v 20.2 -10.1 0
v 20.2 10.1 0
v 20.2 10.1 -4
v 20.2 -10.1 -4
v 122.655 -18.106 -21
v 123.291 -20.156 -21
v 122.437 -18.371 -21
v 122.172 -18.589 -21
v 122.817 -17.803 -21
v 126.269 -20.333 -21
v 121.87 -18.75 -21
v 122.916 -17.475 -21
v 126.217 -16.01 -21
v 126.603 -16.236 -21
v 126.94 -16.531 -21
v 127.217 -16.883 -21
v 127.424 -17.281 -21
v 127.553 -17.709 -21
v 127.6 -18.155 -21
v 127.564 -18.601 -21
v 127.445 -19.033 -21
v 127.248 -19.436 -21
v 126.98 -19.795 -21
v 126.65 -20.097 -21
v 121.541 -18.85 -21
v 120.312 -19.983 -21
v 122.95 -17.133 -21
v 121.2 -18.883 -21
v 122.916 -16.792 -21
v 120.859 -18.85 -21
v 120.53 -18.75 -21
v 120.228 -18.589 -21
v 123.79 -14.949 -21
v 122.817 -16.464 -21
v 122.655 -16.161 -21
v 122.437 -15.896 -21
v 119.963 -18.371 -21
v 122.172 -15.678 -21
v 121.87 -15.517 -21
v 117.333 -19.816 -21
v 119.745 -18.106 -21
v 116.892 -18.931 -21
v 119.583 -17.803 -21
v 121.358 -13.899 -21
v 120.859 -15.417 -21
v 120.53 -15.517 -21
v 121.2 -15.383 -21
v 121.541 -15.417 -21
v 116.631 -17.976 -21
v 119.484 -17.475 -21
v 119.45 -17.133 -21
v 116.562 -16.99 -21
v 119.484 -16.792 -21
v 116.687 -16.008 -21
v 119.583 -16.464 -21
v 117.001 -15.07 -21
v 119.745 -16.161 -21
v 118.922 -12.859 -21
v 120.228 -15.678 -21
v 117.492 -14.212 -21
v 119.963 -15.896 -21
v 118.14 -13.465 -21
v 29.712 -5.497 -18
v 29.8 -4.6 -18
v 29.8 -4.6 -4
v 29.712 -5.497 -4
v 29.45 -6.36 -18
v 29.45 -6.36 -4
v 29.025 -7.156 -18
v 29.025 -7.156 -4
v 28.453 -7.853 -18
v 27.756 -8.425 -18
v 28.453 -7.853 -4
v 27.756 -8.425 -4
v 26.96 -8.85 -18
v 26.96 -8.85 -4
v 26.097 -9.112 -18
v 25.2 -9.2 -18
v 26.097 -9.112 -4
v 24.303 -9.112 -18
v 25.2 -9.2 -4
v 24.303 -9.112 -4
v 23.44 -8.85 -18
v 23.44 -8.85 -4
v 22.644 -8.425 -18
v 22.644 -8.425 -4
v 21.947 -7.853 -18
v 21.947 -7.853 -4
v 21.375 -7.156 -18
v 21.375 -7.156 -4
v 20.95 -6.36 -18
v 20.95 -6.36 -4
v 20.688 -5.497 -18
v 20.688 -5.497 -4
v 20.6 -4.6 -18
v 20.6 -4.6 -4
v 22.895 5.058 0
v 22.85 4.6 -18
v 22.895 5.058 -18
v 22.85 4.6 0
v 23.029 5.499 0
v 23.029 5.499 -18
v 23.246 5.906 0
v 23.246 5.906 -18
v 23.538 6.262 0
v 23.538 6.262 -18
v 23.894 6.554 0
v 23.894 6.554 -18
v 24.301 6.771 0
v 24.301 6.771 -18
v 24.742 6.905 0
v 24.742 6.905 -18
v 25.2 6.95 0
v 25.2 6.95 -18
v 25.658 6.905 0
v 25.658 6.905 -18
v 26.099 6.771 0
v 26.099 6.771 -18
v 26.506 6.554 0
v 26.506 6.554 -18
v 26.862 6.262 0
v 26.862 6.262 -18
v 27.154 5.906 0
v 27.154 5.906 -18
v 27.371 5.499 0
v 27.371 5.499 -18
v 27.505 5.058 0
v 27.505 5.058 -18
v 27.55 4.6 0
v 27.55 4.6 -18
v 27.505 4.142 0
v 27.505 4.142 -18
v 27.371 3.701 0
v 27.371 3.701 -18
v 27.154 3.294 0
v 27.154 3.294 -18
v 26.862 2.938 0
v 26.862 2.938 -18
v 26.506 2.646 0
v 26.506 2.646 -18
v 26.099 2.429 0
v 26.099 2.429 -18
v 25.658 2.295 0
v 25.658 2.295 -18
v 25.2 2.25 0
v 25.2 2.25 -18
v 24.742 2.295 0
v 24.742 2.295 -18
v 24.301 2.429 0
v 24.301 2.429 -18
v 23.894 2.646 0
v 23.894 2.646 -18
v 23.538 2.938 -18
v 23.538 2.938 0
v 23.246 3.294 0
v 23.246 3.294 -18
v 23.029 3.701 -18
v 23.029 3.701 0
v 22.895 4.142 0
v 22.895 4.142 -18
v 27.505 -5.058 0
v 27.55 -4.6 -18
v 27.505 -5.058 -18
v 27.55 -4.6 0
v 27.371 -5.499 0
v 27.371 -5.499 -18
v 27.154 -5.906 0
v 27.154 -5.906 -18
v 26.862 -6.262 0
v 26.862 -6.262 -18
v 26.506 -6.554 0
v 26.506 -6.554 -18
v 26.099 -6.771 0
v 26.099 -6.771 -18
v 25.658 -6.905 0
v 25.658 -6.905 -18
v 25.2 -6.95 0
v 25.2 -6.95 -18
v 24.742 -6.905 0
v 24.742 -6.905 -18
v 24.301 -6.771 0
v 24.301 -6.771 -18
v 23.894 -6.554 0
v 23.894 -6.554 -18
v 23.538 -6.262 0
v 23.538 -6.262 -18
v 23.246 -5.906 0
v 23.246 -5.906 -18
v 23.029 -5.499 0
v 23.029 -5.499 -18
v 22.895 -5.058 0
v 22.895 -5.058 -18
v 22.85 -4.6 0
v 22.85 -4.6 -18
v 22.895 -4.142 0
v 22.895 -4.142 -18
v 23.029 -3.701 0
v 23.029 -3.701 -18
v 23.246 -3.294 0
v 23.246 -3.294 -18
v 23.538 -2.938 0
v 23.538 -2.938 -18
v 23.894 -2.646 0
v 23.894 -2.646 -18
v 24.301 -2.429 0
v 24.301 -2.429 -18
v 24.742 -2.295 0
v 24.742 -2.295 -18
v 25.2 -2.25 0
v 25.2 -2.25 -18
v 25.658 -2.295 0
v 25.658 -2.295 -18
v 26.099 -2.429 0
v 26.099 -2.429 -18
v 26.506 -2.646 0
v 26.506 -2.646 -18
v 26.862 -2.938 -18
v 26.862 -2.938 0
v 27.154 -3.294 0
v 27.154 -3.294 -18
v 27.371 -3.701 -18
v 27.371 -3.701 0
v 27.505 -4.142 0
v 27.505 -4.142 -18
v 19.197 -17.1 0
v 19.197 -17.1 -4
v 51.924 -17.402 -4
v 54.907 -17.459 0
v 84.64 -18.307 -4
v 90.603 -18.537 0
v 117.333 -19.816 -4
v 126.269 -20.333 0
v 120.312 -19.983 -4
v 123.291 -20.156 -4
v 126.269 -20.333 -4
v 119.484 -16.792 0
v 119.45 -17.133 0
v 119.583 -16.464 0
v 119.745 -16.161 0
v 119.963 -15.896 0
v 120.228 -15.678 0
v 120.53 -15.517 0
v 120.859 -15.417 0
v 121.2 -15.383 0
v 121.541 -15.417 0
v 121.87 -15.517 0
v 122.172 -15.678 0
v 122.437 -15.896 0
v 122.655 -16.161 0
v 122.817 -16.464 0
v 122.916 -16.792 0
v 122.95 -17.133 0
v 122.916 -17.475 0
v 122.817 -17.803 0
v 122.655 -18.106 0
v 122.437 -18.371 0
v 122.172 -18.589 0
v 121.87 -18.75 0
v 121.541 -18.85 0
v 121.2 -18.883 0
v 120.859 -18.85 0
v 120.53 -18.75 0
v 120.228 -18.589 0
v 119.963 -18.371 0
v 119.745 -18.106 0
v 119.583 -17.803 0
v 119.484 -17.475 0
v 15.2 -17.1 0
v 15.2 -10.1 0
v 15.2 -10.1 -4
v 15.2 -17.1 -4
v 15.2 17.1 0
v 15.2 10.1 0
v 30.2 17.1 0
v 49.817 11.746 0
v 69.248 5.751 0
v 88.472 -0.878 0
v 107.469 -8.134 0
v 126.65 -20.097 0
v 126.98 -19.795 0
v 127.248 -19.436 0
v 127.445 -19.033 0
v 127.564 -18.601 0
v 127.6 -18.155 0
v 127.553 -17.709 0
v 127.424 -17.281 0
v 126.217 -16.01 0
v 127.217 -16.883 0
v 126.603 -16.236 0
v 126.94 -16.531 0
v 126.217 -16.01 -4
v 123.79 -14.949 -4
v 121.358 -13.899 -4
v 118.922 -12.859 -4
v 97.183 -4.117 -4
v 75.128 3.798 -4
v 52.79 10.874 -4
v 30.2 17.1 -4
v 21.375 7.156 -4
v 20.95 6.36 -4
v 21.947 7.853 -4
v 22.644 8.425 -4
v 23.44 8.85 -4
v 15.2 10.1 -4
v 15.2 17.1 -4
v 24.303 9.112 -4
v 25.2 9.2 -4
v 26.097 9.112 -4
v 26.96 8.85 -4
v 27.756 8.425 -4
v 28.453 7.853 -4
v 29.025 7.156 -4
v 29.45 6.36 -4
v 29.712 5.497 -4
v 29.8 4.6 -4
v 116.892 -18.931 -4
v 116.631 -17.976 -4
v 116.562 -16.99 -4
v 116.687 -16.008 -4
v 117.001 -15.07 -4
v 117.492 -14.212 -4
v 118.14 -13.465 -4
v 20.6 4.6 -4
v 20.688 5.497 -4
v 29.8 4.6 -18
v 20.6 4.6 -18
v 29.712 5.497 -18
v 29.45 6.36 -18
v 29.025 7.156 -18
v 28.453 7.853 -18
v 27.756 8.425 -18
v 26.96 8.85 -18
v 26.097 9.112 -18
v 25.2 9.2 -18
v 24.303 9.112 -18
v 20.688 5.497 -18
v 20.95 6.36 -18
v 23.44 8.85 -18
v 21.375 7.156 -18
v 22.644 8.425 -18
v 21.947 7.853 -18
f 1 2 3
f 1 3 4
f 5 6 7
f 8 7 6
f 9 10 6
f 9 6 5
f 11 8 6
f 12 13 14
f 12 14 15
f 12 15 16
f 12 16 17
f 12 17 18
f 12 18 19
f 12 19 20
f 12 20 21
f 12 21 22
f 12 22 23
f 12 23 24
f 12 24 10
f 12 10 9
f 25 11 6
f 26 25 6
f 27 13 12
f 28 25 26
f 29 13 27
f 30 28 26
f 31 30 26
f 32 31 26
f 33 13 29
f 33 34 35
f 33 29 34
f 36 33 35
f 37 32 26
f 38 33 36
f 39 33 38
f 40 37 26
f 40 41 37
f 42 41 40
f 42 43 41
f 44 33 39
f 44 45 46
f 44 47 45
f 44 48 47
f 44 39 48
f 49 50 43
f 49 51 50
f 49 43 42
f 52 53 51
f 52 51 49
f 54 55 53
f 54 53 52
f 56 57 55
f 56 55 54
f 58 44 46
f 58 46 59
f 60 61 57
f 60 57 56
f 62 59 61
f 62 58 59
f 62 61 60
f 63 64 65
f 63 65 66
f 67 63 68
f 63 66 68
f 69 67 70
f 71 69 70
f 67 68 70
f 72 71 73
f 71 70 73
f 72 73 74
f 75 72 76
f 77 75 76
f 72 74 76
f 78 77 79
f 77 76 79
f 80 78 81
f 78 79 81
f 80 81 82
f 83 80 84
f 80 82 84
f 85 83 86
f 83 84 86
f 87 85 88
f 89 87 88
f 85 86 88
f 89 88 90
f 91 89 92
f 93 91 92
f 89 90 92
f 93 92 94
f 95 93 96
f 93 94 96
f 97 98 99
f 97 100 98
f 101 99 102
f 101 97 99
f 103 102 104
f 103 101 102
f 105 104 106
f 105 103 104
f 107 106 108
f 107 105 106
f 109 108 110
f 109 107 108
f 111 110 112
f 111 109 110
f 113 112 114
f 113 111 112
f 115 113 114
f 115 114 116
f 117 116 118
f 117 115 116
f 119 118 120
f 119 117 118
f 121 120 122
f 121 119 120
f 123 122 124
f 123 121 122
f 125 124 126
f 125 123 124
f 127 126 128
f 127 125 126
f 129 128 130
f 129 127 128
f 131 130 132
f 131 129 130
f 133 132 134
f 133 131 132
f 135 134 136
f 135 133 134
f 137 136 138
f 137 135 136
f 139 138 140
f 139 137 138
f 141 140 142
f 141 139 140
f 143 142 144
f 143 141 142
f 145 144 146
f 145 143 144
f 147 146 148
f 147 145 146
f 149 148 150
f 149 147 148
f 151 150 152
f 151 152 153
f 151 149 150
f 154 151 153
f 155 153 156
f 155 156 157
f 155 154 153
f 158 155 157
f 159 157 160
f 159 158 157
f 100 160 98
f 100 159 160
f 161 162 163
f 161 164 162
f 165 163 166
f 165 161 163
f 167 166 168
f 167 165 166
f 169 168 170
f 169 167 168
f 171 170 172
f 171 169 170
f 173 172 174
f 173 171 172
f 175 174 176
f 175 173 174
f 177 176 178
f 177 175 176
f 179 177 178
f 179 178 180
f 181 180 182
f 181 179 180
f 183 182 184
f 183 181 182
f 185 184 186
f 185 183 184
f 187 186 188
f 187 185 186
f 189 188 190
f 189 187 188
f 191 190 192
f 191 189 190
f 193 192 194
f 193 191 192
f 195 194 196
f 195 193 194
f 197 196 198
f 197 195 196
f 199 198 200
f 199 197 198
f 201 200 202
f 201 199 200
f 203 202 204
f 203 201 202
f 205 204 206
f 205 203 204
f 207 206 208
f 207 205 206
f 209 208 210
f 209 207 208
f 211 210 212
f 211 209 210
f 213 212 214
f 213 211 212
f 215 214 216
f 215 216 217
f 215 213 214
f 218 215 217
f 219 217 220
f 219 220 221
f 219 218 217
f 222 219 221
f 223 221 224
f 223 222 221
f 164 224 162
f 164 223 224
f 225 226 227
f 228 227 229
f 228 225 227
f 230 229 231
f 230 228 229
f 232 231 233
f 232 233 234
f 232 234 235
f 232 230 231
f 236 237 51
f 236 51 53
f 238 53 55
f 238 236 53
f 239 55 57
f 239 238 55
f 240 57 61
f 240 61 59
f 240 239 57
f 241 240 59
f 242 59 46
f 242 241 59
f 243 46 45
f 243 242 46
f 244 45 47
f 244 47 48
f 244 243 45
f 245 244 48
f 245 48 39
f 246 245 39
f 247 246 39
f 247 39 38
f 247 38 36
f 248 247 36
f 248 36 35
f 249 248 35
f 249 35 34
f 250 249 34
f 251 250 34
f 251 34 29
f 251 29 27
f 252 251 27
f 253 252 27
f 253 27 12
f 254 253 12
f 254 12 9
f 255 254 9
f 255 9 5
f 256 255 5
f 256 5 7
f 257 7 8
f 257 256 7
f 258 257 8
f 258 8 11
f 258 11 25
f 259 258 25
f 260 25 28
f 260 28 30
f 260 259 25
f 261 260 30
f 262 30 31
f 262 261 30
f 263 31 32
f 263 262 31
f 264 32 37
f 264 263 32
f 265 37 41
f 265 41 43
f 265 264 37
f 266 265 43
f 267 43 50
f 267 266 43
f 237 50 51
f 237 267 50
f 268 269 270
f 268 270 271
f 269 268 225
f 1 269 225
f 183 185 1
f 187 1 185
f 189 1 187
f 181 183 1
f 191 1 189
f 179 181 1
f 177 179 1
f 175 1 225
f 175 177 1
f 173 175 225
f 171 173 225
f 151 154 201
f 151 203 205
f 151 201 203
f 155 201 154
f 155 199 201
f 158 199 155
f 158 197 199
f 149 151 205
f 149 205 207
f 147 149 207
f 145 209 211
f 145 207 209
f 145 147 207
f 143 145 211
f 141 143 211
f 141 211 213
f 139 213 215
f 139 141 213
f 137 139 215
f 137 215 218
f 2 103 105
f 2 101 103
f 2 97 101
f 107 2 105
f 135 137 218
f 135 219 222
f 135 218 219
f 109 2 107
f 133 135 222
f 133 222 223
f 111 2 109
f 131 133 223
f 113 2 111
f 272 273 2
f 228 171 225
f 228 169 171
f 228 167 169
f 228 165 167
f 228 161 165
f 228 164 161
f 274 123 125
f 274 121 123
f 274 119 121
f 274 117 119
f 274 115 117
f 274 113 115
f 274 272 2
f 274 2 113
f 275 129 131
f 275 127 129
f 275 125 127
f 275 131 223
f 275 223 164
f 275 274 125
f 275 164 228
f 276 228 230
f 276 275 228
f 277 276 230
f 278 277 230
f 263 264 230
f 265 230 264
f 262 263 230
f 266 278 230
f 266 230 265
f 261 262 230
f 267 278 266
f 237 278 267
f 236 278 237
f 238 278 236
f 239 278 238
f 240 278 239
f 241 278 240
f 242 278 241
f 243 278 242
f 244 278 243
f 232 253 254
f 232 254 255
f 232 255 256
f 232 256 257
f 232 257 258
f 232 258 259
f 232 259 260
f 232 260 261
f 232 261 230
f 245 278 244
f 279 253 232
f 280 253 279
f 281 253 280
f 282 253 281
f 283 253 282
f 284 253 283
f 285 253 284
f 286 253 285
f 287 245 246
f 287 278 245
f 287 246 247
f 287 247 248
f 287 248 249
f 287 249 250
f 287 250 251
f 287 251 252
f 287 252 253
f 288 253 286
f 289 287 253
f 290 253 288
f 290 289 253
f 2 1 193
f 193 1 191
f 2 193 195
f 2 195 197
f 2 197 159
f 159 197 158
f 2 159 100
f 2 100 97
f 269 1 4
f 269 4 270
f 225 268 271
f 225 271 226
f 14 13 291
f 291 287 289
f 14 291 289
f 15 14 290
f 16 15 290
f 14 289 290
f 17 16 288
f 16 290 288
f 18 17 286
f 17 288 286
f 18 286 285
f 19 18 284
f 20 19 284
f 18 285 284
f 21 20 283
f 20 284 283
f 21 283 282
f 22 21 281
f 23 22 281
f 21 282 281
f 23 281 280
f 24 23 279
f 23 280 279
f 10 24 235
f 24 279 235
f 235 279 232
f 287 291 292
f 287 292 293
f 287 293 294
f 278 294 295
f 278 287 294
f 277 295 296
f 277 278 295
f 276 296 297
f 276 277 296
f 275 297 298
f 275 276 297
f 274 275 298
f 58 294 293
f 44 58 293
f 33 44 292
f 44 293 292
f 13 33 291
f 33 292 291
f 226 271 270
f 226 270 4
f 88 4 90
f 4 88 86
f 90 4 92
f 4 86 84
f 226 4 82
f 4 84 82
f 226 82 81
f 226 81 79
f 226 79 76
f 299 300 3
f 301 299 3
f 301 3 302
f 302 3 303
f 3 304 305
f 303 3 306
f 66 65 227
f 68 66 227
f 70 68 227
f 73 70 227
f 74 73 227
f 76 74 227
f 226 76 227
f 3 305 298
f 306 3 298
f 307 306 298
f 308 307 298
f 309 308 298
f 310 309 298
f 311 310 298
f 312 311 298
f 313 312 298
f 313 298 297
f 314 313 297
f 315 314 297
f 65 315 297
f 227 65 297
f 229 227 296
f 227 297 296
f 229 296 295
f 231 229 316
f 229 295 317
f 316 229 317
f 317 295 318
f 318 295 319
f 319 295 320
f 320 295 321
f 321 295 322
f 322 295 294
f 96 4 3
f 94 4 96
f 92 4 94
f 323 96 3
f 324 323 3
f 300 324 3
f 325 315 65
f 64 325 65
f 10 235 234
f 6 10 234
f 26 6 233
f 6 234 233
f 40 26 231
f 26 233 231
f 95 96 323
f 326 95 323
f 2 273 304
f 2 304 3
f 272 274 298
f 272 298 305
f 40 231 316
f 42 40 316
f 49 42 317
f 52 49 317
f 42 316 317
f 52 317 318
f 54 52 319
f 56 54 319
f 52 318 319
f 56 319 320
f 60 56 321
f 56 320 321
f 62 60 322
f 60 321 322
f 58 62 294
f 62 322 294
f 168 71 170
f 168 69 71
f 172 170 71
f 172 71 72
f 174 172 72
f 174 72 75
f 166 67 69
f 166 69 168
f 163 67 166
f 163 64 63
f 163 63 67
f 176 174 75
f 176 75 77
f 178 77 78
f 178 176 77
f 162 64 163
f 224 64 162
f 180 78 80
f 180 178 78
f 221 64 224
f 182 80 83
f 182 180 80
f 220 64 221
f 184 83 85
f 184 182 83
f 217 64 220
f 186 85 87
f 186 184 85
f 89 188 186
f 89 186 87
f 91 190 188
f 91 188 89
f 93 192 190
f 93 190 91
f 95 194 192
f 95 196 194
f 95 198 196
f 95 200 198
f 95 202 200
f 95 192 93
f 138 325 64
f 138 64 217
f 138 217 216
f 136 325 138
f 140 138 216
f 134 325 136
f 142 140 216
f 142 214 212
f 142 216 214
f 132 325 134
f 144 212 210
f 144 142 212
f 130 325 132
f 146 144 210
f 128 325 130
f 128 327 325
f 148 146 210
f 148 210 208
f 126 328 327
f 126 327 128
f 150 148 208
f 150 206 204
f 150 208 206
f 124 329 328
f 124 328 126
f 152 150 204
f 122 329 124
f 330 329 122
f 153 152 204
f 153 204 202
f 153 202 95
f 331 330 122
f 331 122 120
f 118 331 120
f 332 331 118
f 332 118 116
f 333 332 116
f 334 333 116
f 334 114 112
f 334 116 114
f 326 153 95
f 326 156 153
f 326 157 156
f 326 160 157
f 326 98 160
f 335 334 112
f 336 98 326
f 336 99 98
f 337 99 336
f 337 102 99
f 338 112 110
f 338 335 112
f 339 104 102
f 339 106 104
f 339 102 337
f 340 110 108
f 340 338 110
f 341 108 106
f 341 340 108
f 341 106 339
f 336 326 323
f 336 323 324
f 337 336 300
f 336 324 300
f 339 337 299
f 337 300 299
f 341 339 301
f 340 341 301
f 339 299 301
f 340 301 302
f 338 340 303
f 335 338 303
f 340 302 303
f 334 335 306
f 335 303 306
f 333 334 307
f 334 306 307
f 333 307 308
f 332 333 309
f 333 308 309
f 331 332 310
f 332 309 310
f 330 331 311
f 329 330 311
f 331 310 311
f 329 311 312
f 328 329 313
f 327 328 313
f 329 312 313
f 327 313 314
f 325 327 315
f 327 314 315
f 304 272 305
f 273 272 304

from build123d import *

# Parameters (mm, degrees)
SZKIC2_R                    = 2.35
DODANIE_WYCI_GNI_CIE1_DEPTH = 4
SZKIC3_R                    = 1.75
DODANIE_WYCI_GNI_CIE2_DEPTH = 17
DODANIE_WYCI_GNI_CIE3_DEPTH = 14
SZKIC6_R                    = 2.35
SZKIC6_R_2                  = 1.75
WYTNIJ_WYCI_GNI_CIE2_DEPTH  = 131.905876654


with BuildPart() as part:
    # Szkic2 → Dodanie-wyciągnięcie1 (new body)
    with BuildSketch(Plane.XY):
        with BuildLine():
            Line((15.2, 17.1), (15.2, 10.1))
            Line((15.2, 10.1), (20.2, 10.1))
            Line((20.2, 10.1), (20.2, -10.1))
            Line((20.2, -10.1), (15.2, -10.1))
            Line((15.2, -10.1), (15.2, -17.1))
            Line((15.2, -17.1), (19.197379501, -17.1))
            ThreePointArc((19.197379501, -17.1), (72.757727431, -17.908543704), (126.269263581, -20.333437957))
            ThreePointArc((126.269263581, -20.333437957), (127.600370297, -18.154974458), (126.216652739, -16.009543491))
            ThreePointArc((126.216652739, -16.009543491), (78.887653554, 2.515256091), (30.2, 17.1))
            Line((30.2, 17.1), (15.2, 17.1))
        make_face()
        with Locations(Location((25.2, 4.6, 0), (0, 0, 180))):
            Circle(SZKIC2_R, mode=Mode.SUBTRACT)
        with Locations((25.2, -4.6)):
            Circle(SZKIC2_R, mode=Mode.SUBTRACT)
    extrude(amount=DODANIE_WYCI_GNI_CIE1_DEPTH)

    # Szkic3 → Dodanie-wyciągnięcie2 (add)
    with BuildSketch(Plane.XY.offset(4)):
        with BuildLine():
            ThreePointArc((126.269263581, -20.333437957), (121.801544753, -20.069007105), (117.33317317, -19.815845914))
            ThreePointArc((117.33317317, -19.815845914), (116.687057134, -16.008461108), (118.922411718, -12.859360463))
            ThreePointArc((118.922411718, -12.859360463), (122.574580097, -14.42276365), (126.216652739, -16.009543491))
            ThreePointArc((126.216652739, -16.009543491), (127.600370297, -18.154974458), (126.269263581, -20.333437957))
        make_face()
        with Locations((121.2, -17.133437957)):
            Circle(SZKIC3_R, mode=Mode.SUBTRACT)
    extrude(amount=DODANIE_WYCI_GNI_CIE2_DEPTH)

    # Szkic5 → Dodanie-wyciągnięcie3 (add)
    with BuildSketch(Plane.XY.offset(4)):
        with BuildLine():
            Line((20.6, -4.6), (20.6, 4.6))
            ThreePointArc((20.6, 4.6), (25.2, 9.2), (29.8, 4.6))
            Line((29.8, 4.6), (29.8, -4.6))
            ThreePointArc((29.8, -4.6), (25.2, -9.2), (20.6, -4.6))
        make_face()
    extrude(amount=DODANIE_WYCI_GNI_CIE3_DEPTH)

    # Szkic6 → Wytnij-wyciągnięcie2 (cut, through all)
    with BuildSketch(Plane(origin=(0, 0, 0), x_dir=(-1, 0, 0), z_dir=(0, 0, -1))):
        with Locations(Location((-25.2, -4.6, 0), (0, 0, 180))):
            Circle(SZKIC6_R)
        with Locations((-25.2, 4.6)):
            Circle(SZKIC6_R)
        with Locations((-121.2, -17.133437957)):
            Circle(SZKIC6_R_2)
    extrude(amount=-WYTNIJ_WYCI_GNI_CIE2_DEPTH, mode=Mode.SUBTRACT)


with BuildPart() as body_2:
    # Lustro1: mirrored copy
    add(part.part.mirror(Plane(origin=(125.2, -18.184180883, 0), x_dir=(1, 0, 0), z_dir=(0, 0, -1))))


solid = body_2.part
